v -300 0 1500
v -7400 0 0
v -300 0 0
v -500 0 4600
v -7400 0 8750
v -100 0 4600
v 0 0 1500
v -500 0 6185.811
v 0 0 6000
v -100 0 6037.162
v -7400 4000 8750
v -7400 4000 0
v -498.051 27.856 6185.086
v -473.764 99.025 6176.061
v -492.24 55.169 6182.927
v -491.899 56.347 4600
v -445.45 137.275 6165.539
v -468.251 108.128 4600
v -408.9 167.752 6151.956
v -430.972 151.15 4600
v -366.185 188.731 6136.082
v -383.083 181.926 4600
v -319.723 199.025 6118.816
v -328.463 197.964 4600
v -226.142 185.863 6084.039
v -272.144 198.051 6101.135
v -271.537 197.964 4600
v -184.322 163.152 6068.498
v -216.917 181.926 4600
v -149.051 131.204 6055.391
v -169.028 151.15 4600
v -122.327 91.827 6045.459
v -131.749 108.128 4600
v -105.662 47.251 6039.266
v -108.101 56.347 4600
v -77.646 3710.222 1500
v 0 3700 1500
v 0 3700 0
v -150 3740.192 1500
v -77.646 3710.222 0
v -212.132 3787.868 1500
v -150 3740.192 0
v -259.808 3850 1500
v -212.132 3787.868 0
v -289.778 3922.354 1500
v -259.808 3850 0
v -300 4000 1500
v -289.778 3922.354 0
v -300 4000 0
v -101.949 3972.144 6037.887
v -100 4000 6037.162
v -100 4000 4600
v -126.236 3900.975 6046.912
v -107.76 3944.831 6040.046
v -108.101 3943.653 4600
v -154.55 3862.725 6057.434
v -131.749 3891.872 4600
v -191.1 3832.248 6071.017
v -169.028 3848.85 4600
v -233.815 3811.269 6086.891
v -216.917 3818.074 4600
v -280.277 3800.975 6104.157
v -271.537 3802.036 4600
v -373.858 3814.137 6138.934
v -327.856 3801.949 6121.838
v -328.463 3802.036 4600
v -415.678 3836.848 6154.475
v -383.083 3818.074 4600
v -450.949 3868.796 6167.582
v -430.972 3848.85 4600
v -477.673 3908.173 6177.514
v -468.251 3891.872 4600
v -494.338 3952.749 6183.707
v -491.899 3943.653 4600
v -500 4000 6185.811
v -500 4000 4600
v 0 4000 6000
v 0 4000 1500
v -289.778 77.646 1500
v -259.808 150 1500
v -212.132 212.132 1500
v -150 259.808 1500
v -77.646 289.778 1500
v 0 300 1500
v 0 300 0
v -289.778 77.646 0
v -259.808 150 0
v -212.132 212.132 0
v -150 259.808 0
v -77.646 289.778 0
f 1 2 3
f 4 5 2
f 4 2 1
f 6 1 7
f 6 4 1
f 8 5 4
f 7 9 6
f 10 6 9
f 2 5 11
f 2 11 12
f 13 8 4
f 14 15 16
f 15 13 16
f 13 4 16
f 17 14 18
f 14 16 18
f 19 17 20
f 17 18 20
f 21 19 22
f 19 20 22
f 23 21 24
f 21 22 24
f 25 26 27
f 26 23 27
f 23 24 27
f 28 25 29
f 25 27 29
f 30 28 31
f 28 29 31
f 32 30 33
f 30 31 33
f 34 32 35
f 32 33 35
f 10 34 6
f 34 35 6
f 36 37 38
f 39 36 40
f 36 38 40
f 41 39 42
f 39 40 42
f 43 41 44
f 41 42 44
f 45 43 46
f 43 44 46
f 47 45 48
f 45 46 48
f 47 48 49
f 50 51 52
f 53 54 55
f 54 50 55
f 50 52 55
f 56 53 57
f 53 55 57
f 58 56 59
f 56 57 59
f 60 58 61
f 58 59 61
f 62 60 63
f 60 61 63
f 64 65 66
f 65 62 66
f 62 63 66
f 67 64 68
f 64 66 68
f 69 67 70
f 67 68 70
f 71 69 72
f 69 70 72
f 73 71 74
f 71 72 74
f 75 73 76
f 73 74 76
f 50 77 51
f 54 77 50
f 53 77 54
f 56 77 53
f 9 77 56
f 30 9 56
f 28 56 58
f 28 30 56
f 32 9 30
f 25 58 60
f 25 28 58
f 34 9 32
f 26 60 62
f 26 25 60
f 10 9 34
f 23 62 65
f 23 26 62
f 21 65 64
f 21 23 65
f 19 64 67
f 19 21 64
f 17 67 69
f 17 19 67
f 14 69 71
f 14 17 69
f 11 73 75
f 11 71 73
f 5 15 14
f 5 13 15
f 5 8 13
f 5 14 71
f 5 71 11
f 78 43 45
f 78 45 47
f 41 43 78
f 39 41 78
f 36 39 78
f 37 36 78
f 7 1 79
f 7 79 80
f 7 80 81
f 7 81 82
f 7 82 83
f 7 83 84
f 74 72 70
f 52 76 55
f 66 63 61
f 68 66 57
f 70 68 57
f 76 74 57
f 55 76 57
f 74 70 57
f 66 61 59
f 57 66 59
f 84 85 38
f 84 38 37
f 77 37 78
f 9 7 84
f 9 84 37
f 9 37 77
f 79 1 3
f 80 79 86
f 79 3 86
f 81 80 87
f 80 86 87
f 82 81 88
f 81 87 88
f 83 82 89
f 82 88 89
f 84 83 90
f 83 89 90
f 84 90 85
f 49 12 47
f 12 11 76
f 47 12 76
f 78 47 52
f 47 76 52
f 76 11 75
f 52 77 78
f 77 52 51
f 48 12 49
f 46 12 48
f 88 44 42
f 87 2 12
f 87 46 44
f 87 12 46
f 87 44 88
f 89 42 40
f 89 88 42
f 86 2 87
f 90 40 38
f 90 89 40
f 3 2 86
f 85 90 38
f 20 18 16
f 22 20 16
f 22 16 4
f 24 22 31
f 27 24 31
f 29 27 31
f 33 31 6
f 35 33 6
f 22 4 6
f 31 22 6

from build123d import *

# Parameters (mm, degrees)
F1_DEPTH = 4000
F2_R     = 300
F3_DEPTH = 1500
F5_R     = 200
F6_DEPTH = 1586.8108108108


with BuildPart() as f1:
    # F0 (on Front) → F1 (new body)
    with BuildSketch(Plane.XZ):
        Polygon((-7400, 0), (0, 0), (0, 6000), (-7400, 8750), align=None)
    extrude(amount=-F1_DEPTH)

    # F2 (on face) → F3 (cut)
    with BuildSketch(Plane(origin=(0, 0, 0), x_dir=(1, 0, 0), z_dir=(0, 0, -1))):
        Circle(F2_R)
        with Locations((0, -4000)):
            Circle(F2_R)
    extrude(amount=-F3_DEPTH, mode=Mode.SUBTRACT)

    # F5 (on offset) → F6 (cut, up to face)
    with BuildSketch(Plane(origin=(0, 0, 4600), x_dir=(1, 0, 0), z_dir=(0, 0, -1))):
        with Locations((-300, 0)):
            Circle(F5_R)
        with Locations((-300, -4000)):
            Circle(F5_R)
    extrude(amount=-F6_DEPTH, mode=Mode.SUBTRACT)


solid = f1.part
